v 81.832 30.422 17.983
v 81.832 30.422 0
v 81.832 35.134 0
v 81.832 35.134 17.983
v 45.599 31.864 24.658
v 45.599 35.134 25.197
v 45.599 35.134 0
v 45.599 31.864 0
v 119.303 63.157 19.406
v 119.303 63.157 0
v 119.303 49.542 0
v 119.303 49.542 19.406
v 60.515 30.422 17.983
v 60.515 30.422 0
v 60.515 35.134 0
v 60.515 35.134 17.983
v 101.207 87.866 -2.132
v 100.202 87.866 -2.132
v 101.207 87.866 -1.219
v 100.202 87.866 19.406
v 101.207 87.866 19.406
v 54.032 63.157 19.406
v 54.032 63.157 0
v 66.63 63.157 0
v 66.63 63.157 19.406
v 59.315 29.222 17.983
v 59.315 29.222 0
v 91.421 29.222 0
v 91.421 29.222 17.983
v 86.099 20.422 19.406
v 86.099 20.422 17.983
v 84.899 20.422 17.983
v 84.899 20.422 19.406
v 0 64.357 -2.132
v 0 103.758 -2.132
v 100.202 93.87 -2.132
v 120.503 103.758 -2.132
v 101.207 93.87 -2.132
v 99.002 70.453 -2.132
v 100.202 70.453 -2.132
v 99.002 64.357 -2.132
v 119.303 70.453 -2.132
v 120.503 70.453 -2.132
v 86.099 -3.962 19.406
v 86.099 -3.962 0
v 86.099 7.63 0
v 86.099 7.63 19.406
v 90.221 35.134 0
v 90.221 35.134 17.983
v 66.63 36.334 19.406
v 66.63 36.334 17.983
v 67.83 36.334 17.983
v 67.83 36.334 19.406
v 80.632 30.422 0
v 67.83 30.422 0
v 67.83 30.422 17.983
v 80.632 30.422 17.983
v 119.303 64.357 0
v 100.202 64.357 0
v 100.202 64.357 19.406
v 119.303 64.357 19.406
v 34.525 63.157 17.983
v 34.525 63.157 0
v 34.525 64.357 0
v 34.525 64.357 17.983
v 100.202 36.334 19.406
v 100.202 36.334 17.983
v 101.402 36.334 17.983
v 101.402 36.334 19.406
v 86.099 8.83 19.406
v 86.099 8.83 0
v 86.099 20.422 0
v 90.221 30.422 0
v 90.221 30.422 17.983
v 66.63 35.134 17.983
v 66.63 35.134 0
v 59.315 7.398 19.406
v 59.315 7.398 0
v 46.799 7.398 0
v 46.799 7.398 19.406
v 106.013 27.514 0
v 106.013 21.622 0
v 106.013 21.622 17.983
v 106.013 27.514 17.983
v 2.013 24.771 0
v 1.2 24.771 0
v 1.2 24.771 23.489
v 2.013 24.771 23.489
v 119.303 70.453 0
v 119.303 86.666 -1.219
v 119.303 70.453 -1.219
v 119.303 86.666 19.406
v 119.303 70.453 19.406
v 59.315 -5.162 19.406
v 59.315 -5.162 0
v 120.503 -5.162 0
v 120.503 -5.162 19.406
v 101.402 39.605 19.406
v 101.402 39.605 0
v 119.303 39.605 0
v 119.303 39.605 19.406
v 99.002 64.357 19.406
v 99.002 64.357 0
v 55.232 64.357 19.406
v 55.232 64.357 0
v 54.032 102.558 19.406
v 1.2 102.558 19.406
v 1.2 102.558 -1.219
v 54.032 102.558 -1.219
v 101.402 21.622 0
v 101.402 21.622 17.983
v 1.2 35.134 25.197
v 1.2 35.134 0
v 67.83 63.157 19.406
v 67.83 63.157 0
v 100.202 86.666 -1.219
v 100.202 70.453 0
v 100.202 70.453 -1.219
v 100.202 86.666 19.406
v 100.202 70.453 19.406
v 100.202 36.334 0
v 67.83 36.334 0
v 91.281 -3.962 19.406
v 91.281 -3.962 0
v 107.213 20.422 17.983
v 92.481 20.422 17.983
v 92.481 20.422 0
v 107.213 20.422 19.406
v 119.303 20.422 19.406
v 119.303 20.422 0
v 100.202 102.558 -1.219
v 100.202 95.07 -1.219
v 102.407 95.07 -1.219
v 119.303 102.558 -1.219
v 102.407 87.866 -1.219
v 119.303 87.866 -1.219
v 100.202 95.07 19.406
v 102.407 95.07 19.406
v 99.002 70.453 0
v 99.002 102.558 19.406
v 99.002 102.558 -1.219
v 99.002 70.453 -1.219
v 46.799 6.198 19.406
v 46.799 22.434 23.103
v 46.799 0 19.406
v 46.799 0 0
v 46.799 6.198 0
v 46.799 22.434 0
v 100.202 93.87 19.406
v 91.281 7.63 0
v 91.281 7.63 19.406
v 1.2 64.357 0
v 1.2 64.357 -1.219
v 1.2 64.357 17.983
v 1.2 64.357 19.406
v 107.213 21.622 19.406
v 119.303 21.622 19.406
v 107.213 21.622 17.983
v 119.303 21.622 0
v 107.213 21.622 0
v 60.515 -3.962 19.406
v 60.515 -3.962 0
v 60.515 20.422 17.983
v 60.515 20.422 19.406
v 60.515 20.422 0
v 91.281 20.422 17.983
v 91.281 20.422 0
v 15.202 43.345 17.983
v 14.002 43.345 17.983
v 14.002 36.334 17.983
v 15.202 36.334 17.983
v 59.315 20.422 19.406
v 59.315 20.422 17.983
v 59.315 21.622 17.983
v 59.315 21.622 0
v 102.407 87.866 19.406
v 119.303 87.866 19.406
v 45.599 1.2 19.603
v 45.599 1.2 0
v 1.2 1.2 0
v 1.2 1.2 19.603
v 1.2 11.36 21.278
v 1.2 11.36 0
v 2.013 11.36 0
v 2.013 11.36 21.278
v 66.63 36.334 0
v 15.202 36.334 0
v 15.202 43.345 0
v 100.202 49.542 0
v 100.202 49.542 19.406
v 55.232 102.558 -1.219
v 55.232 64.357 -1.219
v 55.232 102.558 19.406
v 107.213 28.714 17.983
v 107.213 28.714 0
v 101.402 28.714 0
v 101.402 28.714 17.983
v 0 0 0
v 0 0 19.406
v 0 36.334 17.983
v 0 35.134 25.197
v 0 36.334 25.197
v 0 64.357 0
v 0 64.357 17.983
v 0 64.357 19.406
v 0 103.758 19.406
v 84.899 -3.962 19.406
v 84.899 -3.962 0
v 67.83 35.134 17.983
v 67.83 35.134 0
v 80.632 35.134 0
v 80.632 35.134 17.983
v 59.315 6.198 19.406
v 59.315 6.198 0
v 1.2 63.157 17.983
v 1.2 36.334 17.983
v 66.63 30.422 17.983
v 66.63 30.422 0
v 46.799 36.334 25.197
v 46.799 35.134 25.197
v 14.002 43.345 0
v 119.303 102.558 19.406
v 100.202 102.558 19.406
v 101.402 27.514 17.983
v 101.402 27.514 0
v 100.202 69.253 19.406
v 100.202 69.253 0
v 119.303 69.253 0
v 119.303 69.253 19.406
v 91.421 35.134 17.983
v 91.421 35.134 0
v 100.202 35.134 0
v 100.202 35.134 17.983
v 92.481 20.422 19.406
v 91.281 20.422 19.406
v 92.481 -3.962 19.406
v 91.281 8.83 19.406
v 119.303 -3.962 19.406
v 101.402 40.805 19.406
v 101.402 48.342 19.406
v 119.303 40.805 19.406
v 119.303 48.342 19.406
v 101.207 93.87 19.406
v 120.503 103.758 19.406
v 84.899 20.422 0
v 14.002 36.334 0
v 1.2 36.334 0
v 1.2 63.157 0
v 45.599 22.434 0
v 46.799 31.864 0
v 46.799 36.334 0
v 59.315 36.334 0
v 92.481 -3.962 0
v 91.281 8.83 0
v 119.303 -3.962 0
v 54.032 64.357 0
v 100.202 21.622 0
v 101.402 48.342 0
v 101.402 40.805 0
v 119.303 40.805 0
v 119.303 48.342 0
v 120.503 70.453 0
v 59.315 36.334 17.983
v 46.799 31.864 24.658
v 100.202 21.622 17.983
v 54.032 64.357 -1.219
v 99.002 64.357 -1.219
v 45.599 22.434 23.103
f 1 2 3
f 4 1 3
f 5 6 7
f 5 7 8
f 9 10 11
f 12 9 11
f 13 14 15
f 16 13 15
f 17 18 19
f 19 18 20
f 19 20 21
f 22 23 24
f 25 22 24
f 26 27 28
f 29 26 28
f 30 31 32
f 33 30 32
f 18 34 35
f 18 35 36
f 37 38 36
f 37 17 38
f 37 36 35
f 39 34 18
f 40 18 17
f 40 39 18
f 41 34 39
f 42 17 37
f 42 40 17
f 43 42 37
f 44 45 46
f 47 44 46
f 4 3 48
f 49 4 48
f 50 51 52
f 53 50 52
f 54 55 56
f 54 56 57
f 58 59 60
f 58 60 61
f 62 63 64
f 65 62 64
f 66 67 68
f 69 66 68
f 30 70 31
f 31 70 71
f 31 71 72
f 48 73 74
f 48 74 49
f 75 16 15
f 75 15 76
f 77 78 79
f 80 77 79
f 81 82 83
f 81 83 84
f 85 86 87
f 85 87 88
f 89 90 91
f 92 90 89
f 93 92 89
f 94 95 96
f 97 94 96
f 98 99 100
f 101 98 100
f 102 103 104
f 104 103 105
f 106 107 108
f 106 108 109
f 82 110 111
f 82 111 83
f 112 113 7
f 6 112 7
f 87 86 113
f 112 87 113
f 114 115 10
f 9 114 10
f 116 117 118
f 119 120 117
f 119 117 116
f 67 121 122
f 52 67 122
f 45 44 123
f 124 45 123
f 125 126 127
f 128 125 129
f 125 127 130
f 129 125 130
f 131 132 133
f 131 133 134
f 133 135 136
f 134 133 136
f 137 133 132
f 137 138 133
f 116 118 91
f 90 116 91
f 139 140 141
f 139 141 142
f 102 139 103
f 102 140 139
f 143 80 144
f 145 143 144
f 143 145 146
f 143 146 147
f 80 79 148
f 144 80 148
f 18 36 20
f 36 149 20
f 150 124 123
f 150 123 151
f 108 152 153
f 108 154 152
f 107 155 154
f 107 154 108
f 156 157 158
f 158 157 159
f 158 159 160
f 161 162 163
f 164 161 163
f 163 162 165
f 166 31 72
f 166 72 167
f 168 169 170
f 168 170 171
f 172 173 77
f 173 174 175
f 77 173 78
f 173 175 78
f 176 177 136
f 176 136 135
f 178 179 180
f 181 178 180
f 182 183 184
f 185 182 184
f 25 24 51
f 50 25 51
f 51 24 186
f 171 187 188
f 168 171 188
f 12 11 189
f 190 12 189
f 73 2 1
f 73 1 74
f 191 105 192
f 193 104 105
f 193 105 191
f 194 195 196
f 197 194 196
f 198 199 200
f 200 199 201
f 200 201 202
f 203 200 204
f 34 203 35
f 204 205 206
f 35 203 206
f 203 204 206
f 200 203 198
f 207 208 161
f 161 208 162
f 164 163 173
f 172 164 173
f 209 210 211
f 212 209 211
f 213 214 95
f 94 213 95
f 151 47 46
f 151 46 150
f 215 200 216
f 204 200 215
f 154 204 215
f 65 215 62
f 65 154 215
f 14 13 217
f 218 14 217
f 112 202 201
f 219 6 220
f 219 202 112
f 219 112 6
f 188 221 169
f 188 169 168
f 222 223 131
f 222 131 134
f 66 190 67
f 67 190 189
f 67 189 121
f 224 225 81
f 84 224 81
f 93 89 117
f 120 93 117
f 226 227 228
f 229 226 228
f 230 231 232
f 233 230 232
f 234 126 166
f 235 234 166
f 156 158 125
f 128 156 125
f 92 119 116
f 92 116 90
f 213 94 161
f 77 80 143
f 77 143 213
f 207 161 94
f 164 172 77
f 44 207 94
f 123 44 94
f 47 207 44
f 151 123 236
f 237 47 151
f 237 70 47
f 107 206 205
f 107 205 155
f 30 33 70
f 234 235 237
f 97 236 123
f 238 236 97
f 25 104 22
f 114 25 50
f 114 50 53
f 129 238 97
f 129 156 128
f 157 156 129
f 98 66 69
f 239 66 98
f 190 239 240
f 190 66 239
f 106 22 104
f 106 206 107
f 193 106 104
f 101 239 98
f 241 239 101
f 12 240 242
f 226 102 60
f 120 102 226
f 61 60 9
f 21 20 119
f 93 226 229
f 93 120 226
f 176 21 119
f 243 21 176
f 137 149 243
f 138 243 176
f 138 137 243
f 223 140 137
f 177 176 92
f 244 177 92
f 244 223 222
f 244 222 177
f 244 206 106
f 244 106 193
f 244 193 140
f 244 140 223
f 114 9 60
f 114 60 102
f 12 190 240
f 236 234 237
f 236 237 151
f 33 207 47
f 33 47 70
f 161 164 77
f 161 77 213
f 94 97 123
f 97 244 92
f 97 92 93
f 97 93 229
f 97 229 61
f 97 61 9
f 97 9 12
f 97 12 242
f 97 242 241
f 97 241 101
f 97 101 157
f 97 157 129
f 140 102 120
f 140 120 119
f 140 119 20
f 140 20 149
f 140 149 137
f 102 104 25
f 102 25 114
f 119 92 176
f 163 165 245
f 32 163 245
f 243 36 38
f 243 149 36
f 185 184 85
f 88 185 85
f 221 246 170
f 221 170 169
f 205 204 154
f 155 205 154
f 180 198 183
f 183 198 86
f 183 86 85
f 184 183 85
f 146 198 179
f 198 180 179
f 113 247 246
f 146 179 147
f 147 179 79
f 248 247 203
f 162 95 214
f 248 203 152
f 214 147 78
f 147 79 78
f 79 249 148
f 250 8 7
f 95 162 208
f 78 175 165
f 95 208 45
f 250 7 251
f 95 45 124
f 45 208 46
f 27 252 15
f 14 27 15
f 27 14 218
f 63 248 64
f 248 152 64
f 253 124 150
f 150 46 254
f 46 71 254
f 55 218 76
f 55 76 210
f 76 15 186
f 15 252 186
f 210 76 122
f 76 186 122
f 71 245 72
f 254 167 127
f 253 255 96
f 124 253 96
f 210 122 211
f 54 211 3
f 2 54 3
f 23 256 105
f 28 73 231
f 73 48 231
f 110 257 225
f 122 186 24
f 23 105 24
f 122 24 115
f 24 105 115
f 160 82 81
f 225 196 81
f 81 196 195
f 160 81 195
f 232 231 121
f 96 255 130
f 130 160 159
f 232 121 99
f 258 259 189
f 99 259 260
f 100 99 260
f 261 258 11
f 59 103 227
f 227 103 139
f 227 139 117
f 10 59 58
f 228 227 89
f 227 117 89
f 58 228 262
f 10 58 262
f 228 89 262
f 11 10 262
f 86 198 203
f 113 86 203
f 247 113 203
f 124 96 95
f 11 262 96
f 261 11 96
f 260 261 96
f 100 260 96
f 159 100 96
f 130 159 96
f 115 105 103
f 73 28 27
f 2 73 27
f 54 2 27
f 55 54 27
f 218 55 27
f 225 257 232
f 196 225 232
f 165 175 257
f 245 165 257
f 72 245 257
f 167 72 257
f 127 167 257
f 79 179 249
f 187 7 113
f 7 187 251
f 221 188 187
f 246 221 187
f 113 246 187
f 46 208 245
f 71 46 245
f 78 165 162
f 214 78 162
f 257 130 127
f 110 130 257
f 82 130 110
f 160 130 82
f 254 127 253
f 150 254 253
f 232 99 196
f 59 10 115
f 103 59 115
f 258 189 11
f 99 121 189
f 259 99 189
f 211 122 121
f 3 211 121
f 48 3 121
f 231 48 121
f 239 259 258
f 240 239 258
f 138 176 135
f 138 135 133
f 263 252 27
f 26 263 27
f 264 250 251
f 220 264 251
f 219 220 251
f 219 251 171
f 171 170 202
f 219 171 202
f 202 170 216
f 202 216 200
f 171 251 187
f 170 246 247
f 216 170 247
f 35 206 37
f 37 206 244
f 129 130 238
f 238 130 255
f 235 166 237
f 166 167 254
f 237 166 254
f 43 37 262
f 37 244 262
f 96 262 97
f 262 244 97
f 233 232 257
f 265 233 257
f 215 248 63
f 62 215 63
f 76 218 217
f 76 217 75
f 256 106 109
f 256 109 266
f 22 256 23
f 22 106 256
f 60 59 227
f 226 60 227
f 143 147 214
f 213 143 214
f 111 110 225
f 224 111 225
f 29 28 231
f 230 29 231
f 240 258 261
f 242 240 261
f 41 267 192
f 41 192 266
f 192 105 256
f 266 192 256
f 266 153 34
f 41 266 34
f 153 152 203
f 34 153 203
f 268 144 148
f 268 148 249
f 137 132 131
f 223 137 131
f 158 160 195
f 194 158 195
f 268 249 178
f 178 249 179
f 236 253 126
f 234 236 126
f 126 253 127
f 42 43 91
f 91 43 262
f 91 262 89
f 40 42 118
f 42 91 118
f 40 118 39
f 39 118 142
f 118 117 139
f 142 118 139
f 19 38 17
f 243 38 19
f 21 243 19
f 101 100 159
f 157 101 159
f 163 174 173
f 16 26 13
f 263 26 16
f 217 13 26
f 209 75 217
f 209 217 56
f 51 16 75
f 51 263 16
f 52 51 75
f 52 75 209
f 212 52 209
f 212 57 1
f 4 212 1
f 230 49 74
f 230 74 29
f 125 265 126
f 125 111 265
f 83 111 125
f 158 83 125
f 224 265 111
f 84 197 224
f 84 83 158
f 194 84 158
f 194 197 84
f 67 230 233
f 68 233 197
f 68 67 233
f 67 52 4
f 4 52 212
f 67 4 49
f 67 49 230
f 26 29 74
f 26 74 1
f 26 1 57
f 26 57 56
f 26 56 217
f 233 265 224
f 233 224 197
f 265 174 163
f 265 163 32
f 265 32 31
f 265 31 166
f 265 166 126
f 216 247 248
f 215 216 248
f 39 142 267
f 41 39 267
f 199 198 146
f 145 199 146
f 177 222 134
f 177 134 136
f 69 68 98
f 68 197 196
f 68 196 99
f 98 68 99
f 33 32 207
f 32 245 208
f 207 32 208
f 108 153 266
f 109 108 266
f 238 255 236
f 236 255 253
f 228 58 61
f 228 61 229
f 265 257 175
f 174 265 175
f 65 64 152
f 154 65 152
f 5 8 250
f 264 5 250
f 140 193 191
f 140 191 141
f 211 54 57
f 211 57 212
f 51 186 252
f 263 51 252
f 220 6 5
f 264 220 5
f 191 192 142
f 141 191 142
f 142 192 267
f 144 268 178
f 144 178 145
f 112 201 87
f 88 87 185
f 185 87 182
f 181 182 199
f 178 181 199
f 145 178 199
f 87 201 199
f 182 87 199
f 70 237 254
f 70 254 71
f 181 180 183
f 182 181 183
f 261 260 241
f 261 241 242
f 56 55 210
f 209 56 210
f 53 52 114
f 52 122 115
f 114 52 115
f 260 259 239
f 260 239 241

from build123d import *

# Parameters (mm, degrees)
F5_W      = 0.8128
F5_H      = 13.4112
F6_DEPTH  = 25.1968
F8_DEPTH  = 46.8002
F5_W_2    = 19.5072
F5_H_2    = 1.2
F5_W_3    = 5.1816
F5_H_3    = 11.592
F5_W_4    = 17.9008
F5_H_4    = 7.5376
F5_W_5    = 19.1008
F5_H_5    = 4.896
F5_W_6    = 1.2
F5_H_6    = 6.004279983
F9_DEPTH  = 19.4056
F5_W_7    = 4.6104
F5_H_7    = 5.8928
F5_W_8    = 6.1152
F5_H_8    = 4.712
F5_W_9    = 12.8016
F5_W_10   = 8.3888
F5_H_9    = 7.0104
F10_DEPTH = 17.9832
F11_DEPTH = 1.2192
F12_W     = 52.832
F12_H     = 38.2016
F12_W_2   = 1.0041694948
F12_H_2   = 6.004279983
F12_W_3   = 19.1008
F12_H_3   = 16.2133753487
F13_DEPTH = 0.913


with BuildPart() as f6:
    # F5 (on Top) → F6 (new body)
    with BuildSketch(Plane.XY):
        Polygon((0, 36.3344), (0, 0), (46.7992, 0), (46.7992, 1.2), (46.7992, 6.1976), (46.7992, 7.3976), (46.7992, 22.4344), (45.5992, 22.4344), (45.5992, 1.2), (1.2, 1.2), (1.2, 11.36), (1.2, 24.7712), (1.2, 35.1344), (45.5992, 35.1344), (45.5992, 31.864), (46.7992, 31.864), (46.7992, 36.3344), (15.2016, 36.3344), (14.0016, 36.3344), (1.2, 36.3344), align=None)
        with Locations((1.6064, 18.0656)):
            Rectangle(F5_W, F5_H)
    extrude(amount=F6_DEPTH)

    # F7 (on face) → F8 (cut, through all)
    with BuildSketch(Plane(origin=(0, 0, 0), x_dir=(0, -1, 0), z_dir=(-1, 0, 0))):
        Polygon((-35.1344, 25.1968), (0, 19.4056), (0, 25.1968), align=None)
    extrude(amount=-F8_DEPTH, mode=Mode.SUBTRACT)

    # F5 (on Top) → F9 (join)
    with BuildSketch(Plane.XY):
        Polygon((0, 103.7584), (0, 64.3568), (1.2, 64.3568), (1.2, 102.5584), (18.0656, 102.5584), (18.0656, 103.7584), align=None)
        with Locations((27.8192, 103.1584)):
            Rectangle(F5_W_2, F5_H_2)
        Polygon((120.5032, 103.7584), (37.5728, 103.7584), (37.5728, 102.5584), (54.032, 102.5584), (54.032, 64.3568), (55.232, 64.3568), (55.232, 102.5584), (99.0024, 102.5584), (99.0024, 93.8704553318), (100.2024, 93.8704553318), (101.2065694948, 93.8704553318), (101.2065694948, 87.8661753487), (100.2024, 87.8661753487), (99.0024, 87.8661753487), (99.0024, 70.4528), (100.2024, 70.4528), (100.2024, 86.6661753487), (102.4065694948, 86.6661753487), (119.3032, 86.6661753487), (119.3032, 70.4528), (120.5032, 70.4528), align=None)
        Polygon((100.2024, 95.0704553318), (100.2024, 102.5584), (119.3032, 102.5584), (119.3032, 87.8661753487), (102.4065694948, 87.8661753487), (102.4065694948, 95.0704553318), align=None, mode=Mode.SUBTRACT)
        Polygon((46.7992, 7.3976), (46.7992, 6.1976), (59.3152, 6.1976), (59.3152, -3.9624), (59.3152, -5.1624), (60.5152, -5.1624), (119.3032, -5.1624), (120.5032, -5.1624), (120.5032, 70.4528), (119.3032, 70.4528), (100.2024, 70.4528), (99.0024, 70.4528), (99.0024, 64.3568), (55.232, 64.3568), (54.032, 64.3568), (54.032, 63.1568), (66.6304, 63.1568), (66.6304, 36.3344), (67.8304, 36.3344), (67.8304, 63.1568), (119.3032, 63.1568), (119.3032, 49.5424), (100.2024, 49.5424), (100.2024, 36.3344), (101.4024, 36.3344), (101.4024, 39.6048), (119.3032, 39.6048), (119.3032, 21.6216), (107.2128, 21.6216), (107.2128, 20.4216), (119.3032, 20.4216), (119.3032, -3.9624), (92.4808, -3.9624), (92.4808, 20.4216), (91.2808, 20.4216), (91.2808, 8.8296), (86.0992, 8.8296), (86.0992, 20.4216), (84.8992, 20.4216), (84.8992, -3.9624), (60.5152, -3.9624), (60.5152, 20.4216), (59.3152, 20.4216), (59.3152, 7.3976), align=None)
        with Locations((88.69, 1.8336)):
            Rectangle(F5_W_3, F5_H_3, mode=Mode.SUBTRACT)
        with Locations((110.3528, 44.5736)):
            Rectangle(F5_W_4, F5_H_4, mode=Mode.SUBTRACT)
        with Locations((109.7528, 66.8048)):
            Rectangle(F5_W_5, F5_H_5, mode=Mode.SUBTRACT)
        with Locations((99.6024, 90.8683153403)):
            Rectangle(F5_W_6, F5_H_6)
    extrude(amount=F9_DEPTH)

    # F5 (on Top) → F10 (join)
    with BuildSketch(Plane.XY):
        Polygon((0, 64.3568), (0, 36.3344), (1.2, 36.3344), (1.2, 63.1568), (34.5248, 63.1568), (34.5248, 64.3568), (1.2, 64.3568), align=None)
        Polygon((59.3152, 21.6216), (59.3152, 20.4216), (60.5152, 20.4216), (84.8992, 20.4216), (86.0992, 20.4216), (91.2808, 20.4216), (92.4808, 20.4216), (107.2128, 20.4216), (107.2128, 21.6216), (107.2128, 28.7144), (101.4024, 28.7144), (101.4024, 36.3344), (100.2024, 36.3344), (67.8304, 36.3344), (66.6304, 36.3344), (59.3152, 36.3344), (59.3152, 29.2224), (91.4208, 29.2224), (91.4208, 35.1344), (100.2024, 35.1344), (100.2024, 21.6216), align=None)
        with Locations((103.7076, 24.568)):
            Rectangle(F5_W_7, F5_H_7, mode=Mode.SUBTRACT)
        with Locations((63.5728, 32.7784)):
            Rectangle(F5_W_8, F5_H_8, mode=Mode.SUBTRACT)
        with Locations((74.2312, 32.7784)):
            Rectangle(F5_W_9, F5_H_8, mode=Mode.SUBTRACT)
        with Locations((86.0264, 32.7784)):
            Rectangle(F5_W_10, F5_H_8, mode=Mode.SUBTRACT)
        with Locations((14.6016, 39.8396)):
            Rectangle(F5_W_6, F5_H_9)
    extrude(amount=F10_DEPTH)

    # F5 (on Top) → F11 (join)
    with BuildSketch(Plane.XY):
        Polygon((120.5032, 103.7584), (37.5728, 103.7584), (37.5728, 102.5584), (54.032, 102.5584), (54.032, 64.3568), (55.232, 64.3568), (55.232, 102.5584), (99.0024, 102.5584), (99.0024, 93.8704553318), (100.2024, 93.8704553318), (101.2065694948, 93.8704553318), (101.2065694948, 87.8661753487), (100.2024, 87.8661753487), (99.0024, 87.8661753487), (99.0024, 70.4528), (100.2024, 70.4528), (100.2024, 86.6661753487), (102.4065694948, 86.6661753487), (119.3032, 86.6661753487), (119.3032, 70.4528), (120.5032, 70.4528), align=None)
        Polygon((100.2024, 95.0704553318), (100.2024, 102.5584), (119.3032, 102.5584), (119.3032, 87.8661753487), (102.4065694948, 87.8661753487), (102.4065694948, 95.0704553318), align=None, mode=Mode.SUBTRACT)
        with Locations((27.8192, 103.1584)):
            Rectangle(F5_W_2, F5_H_2)
        Polygon((0, 103.7584), (0, 64.3568), (1.2, 64.3568), (1.2, 102.5584), (18.0656, 102.5584), (18.0656, 103.7584), align=None)
        with Locations((99.6024, 90.8683153403)):
            Rectangle(F5_W_6, F5_H_6)
    extrude(amount=-F11_DEPTH)

    # F12 (on face) → F13 (join)
    with BuildSketch(Plane(origin=(0, 0, -1.2192), x_dir=(1, 0, 0), z_dir=(0, 0, -1))):
        with Locations((27.616, -83.4576)):
            Rectangle(F12_W, F12_H)
        Polygon((99.0024, -64.3568), (55.232, -64.3568), (55.232, -102.5584), (99.0024, -102.5584), (99.0024, -70.4528), align=None)
        Polygon((1.2, -64.3568), (0, -64.3568), (0, -103.7584), (120.5032, -103.7584), (120.5032, -70.4528), (119.3032, -70.4528), (119.3032, -86.6661753487), (100.2024, -86.6661753487), (100.2024, -70.4528), (99.0024, -70.4528), (99.0024, -102.5584), (55.232, -102.5584), (55.232, -64.3568), (54.032, -64.3568), (54.032, -102.5584), (1.2, -102.5584), align=None)
        Polygon((119.3032, -102.5584), (100.2024, -102.5584), (100.2024, -95.0704553318), (102.4065694948, -95.0704553318), (102.4065694948, -87.8661753487), (119.3032, -87.8661753487), align=None, mode=Mode.SUBTRACT)
        with Locations((100.7044847474, -90.8683153403)):
            Rectangle(F12_W_2, F12_H_2, mode=Mode.SUBTRACT)
        with Locations((109.7528, -78.5594876744)):
            Rectangle(F12_W_3, F12_H_3)
        Polygon((100.2024, -95.0704553318), (100.2024, -102.5584), (119.3032, -102.5584), (119.3032, -87.8661753487), (102.4065694948, -87.8661753487), (102.4065694948, -95.0704553318), align=None)
    extrude(amount=F13_DEPTH)


solid = f6.part
